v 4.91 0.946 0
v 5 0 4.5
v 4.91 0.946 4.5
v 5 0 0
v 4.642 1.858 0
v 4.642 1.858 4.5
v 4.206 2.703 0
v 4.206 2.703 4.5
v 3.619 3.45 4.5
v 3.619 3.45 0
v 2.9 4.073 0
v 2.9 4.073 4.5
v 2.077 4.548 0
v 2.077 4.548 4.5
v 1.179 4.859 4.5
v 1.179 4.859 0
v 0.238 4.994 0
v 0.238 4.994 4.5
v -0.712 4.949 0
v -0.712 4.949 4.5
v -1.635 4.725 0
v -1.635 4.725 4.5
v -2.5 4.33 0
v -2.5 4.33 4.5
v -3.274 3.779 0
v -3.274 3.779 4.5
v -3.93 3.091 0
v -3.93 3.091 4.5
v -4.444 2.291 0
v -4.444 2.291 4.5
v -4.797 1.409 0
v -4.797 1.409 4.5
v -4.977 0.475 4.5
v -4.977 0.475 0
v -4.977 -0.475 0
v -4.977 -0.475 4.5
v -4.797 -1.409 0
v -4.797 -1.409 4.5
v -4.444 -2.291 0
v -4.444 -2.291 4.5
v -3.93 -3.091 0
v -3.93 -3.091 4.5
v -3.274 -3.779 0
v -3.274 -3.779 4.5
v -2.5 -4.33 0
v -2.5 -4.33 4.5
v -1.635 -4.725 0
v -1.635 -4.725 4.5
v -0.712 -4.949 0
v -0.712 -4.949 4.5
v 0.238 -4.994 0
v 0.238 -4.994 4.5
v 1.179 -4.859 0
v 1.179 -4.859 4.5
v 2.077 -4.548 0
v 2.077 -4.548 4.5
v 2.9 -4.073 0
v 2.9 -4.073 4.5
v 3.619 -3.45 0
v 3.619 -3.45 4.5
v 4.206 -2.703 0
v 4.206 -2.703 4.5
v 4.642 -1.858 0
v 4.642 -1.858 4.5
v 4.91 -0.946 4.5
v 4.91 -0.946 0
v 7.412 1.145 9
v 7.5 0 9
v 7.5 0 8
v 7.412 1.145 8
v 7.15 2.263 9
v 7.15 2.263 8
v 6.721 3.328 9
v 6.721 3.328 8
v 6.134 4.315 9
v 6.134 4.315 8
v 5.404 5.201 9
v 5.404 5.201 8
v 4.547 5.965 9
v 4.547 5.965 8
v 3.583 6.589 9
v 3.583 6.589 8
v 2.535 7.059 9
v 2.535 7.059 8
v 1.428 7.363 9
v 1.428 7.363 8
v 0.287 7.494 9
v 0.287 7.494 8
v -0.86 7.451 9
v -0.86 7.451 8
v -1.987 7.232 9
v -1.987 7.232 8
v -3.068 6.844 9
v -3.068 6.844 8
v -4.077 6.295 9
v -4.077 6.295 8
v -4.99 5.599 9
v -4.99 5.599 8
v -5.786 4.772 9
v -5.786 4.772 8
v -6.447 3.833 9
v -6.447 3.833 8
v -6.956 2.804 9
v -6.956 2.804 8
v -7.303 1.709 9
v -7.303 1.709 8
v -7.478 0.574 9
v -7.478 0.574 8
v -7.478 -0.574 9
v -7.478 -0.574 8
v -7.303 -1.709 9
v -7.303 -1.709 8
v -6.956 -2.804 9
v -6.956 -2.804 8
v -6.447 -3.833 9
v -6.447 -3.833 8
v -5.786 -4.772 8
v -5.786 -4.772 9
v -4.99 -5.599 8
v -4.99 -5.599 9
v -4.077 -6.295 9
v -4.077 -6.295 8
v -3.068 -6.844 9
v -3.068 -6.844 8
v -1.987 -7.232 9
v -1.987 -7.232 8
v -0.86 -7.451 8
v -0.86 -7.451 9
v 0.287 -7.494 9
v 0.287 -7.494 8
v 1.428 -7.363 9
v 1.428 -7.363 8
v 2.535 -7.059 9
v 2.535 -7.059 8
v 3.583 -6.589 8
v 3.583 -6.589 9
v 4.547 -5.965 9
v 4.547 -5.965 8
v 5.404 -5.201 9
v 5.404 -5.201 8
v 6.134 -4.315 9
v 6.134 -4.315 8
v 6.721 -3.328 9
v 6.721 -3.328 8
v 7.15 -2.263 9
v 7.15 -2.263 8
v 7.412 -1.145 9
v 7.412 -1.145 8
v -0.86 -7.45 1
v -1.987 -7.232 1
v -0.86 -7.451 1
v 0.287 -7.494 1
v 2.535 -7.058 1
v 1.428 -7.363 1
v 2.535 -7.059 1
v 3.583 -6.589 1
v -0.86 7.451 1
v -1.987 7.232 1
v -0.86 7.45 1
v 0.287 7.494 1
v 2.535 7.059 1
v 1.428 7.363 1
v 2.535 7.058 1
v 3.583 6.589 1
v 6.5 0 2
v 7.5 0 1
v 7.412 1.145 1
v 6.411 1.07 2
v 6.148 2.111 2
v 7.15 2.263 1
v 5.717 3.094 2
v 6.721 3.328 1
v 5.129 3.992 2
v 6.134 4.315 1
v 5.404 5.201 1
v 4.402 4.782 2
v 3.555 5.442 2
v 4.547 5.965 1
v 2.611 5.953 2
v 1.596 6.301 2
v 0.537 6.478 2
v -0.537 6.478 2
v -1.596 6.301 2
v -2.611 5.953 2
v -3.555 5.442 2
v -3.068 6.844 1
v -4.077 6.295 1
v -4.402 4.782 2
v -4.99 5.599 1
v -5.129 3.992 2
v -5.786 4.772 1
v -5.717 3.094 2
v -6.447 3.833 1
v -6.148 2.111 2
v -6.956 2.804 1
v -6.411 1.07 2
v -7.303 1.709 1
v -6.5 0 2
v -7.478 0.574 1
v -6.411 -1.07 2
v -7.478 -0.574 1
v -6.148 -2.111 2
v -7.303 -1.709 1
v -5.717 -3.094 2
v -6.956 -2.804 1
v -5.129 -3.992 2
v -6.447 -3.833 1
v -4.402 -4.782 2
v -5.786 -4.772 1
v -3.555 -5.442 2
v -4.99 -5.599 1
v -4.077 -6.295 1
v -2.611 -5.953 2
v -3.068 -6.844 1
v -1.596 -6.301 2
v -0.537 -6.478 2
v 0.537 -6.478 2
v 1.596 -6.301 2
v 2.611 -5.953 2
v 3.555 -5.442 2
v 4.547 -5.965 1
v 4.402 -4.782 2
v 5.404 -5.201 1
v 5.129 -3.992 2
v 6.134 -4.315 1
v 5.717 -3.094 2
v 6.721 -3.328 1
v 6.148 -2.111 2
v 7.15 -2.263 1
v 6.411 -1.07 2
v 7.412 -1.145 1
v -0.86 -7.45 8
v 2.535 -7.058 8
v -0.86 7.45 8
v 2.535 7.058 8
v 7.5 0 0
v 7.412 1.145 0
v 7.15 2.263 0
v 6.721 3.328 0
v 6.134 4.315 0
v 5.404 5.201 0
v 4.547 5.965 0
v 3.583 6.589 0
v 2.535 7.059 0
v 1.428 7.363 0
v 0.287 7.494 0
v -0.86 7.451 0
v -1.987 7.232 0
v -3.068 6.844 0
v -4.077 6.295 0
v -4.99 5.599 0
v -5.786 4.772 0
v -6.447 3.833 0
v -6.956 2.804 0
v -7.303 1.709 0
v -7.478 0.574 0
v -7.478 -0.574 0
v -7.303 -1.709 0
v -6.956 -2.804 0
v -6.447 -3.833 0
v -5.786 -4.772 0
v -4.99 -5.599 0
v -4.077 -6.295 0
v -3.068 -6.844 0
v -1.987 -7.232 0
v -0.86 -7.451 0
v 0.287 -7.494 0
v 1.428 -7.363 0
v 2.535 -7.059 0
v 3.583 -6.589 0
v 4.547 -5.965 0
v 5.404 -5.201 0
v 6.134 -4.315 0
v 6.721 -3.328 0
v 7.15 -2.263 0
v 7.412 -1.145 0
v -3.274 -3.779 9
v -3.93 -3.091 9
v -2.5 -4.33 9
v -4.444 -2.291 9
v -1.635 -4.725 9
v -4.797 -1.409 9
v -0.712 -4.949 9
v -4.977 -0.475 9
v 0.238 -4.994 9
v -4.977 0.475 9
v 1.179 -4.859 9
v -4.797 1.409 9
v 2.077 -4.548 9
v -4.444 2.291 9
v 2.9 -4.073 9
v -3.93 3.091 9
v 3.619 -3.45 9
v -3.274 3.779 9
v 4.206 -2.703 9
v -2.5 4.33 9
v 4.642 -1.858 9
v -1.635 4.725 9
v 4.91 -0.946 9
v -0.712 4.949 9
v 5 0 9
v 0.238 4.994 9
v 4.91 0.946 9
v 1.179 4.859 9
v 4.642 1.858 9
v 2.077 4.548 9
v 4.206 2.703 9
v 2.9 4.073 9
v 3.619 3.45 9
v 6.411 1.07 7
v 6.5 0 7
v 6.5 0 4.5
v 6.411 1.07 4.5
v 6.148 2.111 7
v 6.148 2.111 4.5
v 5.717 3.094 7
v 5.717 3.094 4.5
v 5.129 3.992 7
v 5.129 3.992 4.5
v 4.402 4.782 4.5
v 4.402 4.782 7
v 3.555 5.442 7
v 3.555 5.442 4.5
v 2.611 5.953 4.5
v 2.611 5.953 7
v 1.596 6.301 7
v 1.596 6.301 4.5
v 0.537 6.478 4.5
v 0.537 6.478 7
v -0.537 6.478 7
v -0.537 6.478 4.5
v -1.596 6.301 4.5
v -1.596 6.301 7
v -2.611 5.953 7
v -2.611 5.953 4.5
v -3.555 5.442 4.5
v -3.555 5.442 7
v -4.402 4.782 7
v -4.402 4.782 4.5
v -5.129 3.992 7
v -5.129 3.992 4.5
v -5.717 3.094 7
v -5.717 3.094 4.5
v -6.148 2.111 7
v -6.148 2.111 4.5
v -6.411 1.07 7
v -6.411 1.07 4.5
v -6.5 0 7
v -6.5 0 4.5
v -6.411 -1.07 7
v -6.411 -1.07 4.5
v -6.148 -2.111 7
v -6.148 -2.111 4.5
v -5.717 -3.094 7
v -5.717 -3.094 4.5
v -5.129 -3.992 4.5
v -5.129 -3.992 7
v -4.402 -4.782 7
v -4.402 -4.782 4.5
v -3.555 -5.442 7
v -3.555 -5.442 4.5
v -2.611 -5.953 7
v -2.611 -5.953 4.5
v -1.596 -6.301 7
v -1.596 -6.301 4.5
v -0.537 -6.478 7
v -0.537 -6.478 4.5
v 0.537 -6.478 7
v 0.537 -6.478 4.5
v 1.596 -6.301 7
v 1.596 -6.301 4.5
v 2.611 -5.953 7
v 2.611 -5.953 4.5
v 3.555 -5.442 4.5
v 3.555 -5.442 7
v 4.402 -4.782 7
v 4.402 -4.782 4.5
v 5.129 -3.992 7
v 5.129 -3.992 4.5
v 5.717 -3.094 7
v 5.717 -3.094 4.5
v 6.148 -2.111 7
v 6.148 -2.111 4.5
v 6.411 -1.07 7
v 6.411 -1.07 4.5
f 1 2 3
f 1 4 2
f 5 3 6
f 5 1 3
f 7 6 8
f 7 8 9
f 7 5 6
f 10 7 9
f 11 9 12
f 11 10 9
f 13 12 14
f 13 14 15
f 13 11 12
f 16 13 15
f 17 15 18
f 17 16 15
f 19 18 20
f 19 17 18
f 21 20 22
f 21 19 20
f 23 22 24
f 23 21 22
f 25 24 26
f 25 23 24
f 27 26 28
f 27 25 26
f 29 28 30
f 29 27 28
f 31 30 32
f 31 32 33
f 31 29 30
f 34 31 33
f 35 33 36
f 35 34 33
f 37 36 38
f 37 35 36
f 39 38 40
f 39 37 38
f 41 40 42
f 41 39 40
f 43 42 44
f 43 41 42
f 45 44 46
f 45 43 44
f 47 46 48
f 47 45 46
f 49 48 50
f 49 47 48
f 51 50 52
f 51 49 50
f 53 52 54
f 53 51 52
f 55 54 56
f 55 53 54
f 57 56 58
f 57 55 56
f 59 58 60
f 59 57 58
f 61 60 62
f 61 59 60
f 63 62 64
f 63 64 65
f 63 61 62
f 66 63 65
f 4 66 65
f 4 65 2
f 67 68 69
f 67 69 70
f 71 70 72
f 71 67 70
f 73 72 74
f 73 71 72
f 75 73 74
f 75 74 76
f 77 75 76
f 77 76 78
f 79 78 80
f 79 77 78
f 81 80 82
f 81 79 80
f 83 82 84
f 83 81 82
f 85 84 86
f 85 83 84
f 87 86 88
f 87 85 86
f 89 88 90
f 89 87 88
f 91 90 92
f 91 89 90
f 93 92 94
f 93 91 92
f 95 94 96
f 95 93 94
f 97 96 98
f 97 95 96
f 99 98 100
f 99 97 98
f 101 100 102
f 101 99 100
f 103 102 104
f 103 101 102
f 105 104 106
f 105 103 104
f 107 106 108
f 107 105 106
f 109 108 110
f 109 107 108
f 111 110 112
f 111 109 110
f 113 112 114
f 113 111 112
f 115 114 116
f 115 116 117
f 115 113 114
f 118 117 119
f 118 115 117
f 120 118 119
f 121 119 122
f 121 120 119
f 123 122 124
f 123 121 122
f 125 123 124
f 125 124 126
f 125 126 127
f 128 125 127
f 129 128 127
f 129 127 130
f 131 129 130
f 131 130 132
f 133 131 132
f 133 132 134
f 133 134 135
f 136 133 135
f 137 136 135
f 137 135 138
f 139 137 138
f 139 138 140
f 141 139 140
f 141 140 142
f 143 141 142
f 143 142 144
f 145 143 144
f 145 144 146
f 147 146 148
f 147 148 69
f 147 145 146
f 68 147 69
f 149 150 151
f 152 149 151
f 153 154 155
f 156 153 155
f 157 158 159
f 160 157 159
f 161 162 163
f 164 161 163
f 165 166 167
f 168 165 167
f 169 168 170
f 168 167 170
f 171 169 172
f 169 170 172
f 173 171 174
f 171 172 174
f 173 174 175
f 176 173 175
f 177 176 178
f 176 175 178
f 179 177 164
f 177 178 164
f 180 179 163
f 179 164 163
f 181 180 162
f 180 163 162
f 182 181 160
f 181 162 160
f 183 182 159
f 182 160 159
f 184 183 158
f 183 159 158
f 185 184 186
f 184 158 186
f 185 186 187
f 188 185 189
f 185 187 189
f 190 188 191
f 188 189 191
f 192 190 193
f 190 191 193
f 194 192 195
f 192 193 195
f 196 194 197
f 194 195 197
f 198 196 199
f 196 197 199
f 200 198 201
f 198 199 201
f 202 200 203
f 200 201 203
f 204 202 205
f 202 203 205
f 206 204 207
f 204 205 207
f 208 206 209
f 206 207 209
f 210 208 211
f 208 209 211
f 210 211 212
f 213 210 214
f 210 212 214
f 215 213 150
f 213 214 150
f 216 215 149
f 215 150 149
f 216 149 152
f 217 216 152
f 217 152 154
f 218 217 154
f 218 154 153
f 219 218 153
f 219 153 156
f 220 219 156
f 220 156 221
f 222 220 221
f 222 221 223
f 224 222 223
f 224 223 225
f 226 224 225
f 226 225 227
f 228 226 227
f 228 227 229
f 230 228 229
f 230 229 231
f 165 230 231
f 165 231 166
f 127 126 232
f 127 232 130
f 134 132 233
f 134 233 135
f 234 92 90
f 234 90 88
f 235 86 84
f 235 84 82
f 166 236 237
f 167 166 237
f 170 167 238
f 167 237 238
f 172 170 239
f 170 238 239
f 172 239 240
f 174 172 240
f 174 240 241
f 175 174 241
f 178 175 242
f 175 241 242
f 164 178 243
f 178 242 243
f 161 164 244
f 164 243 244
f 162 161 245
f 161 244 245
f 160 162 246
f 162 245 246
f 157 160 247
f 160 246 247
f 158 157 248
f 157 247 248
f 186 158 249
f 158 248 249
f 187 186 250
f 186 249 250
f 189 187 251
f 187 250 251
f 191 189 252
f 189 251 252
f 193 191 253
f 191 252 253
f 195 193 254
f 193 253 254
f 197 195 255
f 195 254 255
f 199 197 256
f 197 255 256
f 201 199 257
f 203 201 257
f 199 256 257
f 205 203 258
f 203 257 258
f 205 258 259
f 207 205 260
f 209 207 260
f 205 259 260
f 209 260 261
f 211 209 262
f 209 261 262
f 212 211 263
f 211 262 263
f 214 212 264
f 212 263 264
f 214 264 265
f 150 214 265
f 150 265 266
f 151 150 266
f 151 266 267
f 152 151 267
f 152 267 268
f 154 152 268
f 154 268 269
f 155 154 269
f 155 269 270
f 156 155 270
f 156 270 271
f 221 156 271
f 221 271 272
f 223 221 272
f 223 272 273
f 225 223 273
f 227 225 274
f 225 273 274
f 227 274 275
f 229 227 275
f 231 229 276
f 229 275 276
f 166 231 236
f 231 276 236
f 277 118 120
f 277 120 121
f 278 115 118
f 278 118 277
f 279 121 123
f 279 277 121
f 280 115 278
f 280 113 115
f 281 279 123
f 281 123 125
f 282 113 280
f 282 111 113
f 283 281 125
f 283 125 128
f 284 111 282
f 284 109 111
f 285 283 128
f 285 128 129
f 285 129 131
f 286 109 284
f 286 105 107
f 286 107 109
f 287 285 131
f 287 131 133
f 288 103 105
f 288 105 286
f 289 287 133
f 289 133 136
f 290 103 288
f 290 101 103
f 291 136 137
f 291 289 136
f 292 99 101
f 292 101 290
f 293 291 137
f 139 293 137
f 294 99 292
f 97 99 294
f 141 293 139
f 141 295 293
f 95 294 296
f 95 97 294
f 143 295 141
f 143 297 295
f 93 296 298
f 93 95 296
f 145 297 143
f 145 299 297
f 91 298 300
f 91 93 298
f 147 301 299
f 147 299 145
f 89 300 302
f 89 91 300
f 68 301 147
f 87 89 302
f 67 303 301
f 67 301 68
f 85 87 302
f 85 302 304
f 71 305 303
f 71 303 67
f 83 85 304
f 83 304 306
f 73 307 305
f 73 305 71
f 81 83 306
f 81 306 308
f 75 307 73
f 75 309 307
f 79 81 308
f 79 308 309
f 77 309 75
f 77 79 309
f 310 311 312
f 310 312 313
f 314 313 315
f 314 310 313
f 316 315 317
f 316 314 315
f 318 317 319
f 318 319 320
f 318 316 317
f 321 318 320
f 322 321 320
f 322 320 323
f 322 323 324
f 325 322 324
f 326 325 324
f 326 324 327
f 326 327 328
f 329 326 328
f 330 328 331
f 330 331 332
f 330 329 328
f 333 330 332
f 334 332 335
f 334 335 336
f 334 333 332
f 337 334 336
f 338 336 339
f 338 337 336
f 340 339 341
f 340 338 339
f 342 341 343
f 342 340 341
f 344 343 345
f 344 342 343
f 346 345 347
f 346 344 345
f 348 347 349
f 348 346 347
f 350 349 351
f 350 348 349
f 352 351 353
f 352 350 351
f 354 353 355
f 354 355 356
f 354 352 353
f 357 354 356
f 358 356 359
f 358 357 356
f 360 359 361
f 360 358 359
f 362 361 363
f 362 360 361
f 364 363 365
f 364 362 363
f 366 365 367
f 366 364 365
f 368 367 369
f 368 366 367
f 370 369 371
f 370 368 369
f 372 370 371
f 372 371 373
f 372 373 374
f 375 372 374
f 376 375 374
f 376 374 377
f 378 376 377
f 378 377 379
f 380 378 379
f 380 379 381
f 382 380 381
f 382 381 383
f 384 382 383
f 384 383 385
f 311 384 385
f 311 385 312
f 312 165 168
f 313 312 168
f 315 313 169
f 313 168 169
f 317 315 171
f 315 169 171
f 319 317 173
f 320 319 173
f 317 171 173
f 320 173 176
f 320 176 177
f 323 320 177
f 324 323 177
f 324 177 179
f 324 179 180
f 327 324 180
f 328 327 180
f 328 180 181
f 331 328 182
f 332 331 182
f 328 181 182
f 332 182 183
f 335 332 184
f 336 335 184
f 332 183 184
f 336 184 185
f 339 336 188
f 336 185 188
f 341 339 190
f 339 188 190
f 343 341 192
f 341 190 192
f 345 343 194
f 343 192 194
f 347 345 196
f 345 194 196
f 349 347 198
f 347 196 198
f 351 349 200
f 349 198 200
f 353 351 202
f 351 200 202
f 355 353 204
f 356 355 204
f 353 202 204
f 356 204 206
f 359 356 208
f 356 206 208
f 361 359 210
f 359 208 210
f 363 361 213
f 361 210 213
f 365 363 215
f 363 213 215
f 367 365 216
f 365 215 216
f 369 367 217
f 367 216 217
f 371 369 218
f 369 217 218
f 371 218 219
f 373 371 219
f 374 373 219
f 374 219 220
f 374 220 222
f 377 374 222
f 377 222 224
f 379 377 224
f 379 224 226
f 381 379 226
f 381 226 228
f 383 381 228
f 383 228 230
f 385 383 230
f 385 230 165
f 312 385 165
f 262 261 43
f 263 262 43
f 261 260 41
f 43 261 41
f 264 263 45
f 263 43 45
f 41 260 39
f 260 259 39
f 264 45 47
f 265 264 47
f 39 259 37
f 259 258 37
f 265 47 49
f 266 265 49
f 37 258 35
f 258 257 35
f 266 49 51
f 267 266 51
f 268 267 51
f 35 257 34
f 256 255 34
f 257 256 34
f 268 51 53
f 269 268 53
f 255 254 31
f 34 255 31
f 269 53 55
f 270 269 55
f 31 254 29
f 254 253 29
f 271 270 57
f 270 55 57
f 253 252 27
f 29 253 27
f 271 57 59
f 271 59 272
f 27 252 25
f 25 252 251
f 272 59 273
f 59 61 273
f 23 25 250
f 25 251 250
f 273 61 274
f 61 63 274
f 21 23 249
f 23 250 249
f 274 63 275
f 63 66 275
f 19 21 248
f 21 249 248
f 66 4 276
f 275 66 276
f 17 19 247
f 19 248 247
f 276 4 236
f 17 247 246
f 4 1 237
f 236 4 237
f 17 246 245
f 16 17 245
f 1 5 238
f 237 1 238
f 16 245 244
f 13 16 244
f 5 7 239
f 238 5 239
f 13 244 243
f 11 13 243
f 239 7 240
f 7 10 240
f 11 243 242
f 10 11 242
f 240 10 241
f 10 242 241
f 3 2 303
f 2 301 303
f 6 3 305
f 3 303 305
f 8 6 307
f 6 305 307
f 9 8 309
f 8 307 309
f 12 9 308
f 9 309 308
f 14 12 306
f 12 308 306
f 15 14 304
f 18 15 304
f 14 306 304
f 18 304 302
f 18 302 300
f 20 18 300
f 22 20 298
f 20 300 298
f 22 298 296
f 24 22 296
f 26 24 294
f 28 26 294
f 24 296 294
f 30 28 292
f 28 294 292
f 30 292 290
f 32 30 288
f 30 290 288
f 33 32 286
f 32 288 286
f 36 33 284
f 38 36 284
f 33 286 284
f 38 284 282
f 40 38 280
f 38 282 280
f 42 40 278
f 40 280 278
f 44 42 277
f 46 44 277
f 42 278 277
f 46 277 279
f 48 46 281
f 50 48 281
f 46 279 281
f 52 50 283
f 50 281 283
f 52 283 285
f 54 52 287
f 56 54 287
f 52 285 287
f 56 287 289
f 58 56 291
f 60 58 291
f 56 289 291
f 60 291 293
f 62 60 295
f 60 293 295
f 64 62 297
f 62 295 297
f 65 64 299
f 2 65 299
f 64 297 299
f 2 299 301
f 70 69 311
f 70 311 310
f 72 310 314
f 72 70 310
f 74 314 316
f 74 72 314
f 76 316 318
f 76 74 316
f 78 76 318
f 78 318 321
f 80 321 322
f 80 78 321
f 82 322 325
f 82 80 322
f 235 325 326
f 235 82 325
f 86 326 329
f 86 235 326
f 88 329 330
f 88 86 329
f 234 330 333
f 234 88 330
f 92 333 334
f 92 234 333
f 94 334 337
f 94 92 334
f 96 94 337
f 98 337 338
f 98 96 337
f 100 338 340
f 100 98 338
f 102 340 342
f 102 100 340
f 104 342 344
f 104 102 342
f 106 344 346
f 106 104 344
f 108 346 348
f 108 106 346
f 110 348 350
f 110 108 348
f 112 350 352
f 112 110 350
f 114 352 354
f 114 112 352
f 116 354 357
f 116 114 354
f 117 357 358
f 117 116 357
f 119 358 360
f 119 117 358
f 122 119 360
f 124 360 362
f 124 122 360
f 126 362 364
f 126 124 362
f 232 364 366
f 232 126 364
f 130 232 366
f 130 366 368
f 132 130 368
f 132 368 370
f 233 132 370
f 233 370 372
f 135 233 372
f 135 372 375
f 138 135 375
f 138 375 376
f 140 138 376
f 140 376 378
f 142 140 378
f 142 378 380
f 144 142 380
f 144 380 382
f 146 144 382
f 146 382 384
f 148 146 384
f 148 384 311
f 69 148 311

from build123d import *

# Parameters (mm, degrees)
SKETCH1_R           = 7.5
SKETCH1_R_2         = 5
BOSS_EXTRUDE1_DEPTH = 1
SKETCH2_R           = 6.5
SKETCH2_R_2         = 5
BOSS_EXTRUDE2_DEPTH = 3.5
CHAMFER1_SIZE       = 1


with BuildPart() as part:
    # Sketch1 → Boss-Extrude1 (new body)
    with BuildSketch(Plane.XY):
        Circle(SKETCH1_R)
        Circle(SKETCH1_R_2, mode=Mode.SUBTRACT)
    extrude(amount=BOSS_EXTRUDE1_DEPTH)

    # Sketch2 → Boss-Extrude2 (add)
    with BuildSketch(Plane.XY.offset(1)):
        Circle(SKETCH2_R)
        Circle(SKETCH2_R_2, mode=Mode.SUBTRACT)
    extrude(amount=BOSS_EXTRUDE2_DEPTH)

    # Chamfer1
    chamfer1_edges = [part.edges().sort_by_distance(p)[0] for p in [
        (-6.5, 0, 1),
    ]]
    chamfer(chamfer1_edges, length=CHAMFER1_SIZE - 0.0001)  # a hair under: the kernel refuses the full size

    # Mirror5: part across plane


with BuildPart() as part_1:
    add(part.part)
    add(part.part.mirror(Plane.XY.offset(4.5)))


solid = part_1.part
